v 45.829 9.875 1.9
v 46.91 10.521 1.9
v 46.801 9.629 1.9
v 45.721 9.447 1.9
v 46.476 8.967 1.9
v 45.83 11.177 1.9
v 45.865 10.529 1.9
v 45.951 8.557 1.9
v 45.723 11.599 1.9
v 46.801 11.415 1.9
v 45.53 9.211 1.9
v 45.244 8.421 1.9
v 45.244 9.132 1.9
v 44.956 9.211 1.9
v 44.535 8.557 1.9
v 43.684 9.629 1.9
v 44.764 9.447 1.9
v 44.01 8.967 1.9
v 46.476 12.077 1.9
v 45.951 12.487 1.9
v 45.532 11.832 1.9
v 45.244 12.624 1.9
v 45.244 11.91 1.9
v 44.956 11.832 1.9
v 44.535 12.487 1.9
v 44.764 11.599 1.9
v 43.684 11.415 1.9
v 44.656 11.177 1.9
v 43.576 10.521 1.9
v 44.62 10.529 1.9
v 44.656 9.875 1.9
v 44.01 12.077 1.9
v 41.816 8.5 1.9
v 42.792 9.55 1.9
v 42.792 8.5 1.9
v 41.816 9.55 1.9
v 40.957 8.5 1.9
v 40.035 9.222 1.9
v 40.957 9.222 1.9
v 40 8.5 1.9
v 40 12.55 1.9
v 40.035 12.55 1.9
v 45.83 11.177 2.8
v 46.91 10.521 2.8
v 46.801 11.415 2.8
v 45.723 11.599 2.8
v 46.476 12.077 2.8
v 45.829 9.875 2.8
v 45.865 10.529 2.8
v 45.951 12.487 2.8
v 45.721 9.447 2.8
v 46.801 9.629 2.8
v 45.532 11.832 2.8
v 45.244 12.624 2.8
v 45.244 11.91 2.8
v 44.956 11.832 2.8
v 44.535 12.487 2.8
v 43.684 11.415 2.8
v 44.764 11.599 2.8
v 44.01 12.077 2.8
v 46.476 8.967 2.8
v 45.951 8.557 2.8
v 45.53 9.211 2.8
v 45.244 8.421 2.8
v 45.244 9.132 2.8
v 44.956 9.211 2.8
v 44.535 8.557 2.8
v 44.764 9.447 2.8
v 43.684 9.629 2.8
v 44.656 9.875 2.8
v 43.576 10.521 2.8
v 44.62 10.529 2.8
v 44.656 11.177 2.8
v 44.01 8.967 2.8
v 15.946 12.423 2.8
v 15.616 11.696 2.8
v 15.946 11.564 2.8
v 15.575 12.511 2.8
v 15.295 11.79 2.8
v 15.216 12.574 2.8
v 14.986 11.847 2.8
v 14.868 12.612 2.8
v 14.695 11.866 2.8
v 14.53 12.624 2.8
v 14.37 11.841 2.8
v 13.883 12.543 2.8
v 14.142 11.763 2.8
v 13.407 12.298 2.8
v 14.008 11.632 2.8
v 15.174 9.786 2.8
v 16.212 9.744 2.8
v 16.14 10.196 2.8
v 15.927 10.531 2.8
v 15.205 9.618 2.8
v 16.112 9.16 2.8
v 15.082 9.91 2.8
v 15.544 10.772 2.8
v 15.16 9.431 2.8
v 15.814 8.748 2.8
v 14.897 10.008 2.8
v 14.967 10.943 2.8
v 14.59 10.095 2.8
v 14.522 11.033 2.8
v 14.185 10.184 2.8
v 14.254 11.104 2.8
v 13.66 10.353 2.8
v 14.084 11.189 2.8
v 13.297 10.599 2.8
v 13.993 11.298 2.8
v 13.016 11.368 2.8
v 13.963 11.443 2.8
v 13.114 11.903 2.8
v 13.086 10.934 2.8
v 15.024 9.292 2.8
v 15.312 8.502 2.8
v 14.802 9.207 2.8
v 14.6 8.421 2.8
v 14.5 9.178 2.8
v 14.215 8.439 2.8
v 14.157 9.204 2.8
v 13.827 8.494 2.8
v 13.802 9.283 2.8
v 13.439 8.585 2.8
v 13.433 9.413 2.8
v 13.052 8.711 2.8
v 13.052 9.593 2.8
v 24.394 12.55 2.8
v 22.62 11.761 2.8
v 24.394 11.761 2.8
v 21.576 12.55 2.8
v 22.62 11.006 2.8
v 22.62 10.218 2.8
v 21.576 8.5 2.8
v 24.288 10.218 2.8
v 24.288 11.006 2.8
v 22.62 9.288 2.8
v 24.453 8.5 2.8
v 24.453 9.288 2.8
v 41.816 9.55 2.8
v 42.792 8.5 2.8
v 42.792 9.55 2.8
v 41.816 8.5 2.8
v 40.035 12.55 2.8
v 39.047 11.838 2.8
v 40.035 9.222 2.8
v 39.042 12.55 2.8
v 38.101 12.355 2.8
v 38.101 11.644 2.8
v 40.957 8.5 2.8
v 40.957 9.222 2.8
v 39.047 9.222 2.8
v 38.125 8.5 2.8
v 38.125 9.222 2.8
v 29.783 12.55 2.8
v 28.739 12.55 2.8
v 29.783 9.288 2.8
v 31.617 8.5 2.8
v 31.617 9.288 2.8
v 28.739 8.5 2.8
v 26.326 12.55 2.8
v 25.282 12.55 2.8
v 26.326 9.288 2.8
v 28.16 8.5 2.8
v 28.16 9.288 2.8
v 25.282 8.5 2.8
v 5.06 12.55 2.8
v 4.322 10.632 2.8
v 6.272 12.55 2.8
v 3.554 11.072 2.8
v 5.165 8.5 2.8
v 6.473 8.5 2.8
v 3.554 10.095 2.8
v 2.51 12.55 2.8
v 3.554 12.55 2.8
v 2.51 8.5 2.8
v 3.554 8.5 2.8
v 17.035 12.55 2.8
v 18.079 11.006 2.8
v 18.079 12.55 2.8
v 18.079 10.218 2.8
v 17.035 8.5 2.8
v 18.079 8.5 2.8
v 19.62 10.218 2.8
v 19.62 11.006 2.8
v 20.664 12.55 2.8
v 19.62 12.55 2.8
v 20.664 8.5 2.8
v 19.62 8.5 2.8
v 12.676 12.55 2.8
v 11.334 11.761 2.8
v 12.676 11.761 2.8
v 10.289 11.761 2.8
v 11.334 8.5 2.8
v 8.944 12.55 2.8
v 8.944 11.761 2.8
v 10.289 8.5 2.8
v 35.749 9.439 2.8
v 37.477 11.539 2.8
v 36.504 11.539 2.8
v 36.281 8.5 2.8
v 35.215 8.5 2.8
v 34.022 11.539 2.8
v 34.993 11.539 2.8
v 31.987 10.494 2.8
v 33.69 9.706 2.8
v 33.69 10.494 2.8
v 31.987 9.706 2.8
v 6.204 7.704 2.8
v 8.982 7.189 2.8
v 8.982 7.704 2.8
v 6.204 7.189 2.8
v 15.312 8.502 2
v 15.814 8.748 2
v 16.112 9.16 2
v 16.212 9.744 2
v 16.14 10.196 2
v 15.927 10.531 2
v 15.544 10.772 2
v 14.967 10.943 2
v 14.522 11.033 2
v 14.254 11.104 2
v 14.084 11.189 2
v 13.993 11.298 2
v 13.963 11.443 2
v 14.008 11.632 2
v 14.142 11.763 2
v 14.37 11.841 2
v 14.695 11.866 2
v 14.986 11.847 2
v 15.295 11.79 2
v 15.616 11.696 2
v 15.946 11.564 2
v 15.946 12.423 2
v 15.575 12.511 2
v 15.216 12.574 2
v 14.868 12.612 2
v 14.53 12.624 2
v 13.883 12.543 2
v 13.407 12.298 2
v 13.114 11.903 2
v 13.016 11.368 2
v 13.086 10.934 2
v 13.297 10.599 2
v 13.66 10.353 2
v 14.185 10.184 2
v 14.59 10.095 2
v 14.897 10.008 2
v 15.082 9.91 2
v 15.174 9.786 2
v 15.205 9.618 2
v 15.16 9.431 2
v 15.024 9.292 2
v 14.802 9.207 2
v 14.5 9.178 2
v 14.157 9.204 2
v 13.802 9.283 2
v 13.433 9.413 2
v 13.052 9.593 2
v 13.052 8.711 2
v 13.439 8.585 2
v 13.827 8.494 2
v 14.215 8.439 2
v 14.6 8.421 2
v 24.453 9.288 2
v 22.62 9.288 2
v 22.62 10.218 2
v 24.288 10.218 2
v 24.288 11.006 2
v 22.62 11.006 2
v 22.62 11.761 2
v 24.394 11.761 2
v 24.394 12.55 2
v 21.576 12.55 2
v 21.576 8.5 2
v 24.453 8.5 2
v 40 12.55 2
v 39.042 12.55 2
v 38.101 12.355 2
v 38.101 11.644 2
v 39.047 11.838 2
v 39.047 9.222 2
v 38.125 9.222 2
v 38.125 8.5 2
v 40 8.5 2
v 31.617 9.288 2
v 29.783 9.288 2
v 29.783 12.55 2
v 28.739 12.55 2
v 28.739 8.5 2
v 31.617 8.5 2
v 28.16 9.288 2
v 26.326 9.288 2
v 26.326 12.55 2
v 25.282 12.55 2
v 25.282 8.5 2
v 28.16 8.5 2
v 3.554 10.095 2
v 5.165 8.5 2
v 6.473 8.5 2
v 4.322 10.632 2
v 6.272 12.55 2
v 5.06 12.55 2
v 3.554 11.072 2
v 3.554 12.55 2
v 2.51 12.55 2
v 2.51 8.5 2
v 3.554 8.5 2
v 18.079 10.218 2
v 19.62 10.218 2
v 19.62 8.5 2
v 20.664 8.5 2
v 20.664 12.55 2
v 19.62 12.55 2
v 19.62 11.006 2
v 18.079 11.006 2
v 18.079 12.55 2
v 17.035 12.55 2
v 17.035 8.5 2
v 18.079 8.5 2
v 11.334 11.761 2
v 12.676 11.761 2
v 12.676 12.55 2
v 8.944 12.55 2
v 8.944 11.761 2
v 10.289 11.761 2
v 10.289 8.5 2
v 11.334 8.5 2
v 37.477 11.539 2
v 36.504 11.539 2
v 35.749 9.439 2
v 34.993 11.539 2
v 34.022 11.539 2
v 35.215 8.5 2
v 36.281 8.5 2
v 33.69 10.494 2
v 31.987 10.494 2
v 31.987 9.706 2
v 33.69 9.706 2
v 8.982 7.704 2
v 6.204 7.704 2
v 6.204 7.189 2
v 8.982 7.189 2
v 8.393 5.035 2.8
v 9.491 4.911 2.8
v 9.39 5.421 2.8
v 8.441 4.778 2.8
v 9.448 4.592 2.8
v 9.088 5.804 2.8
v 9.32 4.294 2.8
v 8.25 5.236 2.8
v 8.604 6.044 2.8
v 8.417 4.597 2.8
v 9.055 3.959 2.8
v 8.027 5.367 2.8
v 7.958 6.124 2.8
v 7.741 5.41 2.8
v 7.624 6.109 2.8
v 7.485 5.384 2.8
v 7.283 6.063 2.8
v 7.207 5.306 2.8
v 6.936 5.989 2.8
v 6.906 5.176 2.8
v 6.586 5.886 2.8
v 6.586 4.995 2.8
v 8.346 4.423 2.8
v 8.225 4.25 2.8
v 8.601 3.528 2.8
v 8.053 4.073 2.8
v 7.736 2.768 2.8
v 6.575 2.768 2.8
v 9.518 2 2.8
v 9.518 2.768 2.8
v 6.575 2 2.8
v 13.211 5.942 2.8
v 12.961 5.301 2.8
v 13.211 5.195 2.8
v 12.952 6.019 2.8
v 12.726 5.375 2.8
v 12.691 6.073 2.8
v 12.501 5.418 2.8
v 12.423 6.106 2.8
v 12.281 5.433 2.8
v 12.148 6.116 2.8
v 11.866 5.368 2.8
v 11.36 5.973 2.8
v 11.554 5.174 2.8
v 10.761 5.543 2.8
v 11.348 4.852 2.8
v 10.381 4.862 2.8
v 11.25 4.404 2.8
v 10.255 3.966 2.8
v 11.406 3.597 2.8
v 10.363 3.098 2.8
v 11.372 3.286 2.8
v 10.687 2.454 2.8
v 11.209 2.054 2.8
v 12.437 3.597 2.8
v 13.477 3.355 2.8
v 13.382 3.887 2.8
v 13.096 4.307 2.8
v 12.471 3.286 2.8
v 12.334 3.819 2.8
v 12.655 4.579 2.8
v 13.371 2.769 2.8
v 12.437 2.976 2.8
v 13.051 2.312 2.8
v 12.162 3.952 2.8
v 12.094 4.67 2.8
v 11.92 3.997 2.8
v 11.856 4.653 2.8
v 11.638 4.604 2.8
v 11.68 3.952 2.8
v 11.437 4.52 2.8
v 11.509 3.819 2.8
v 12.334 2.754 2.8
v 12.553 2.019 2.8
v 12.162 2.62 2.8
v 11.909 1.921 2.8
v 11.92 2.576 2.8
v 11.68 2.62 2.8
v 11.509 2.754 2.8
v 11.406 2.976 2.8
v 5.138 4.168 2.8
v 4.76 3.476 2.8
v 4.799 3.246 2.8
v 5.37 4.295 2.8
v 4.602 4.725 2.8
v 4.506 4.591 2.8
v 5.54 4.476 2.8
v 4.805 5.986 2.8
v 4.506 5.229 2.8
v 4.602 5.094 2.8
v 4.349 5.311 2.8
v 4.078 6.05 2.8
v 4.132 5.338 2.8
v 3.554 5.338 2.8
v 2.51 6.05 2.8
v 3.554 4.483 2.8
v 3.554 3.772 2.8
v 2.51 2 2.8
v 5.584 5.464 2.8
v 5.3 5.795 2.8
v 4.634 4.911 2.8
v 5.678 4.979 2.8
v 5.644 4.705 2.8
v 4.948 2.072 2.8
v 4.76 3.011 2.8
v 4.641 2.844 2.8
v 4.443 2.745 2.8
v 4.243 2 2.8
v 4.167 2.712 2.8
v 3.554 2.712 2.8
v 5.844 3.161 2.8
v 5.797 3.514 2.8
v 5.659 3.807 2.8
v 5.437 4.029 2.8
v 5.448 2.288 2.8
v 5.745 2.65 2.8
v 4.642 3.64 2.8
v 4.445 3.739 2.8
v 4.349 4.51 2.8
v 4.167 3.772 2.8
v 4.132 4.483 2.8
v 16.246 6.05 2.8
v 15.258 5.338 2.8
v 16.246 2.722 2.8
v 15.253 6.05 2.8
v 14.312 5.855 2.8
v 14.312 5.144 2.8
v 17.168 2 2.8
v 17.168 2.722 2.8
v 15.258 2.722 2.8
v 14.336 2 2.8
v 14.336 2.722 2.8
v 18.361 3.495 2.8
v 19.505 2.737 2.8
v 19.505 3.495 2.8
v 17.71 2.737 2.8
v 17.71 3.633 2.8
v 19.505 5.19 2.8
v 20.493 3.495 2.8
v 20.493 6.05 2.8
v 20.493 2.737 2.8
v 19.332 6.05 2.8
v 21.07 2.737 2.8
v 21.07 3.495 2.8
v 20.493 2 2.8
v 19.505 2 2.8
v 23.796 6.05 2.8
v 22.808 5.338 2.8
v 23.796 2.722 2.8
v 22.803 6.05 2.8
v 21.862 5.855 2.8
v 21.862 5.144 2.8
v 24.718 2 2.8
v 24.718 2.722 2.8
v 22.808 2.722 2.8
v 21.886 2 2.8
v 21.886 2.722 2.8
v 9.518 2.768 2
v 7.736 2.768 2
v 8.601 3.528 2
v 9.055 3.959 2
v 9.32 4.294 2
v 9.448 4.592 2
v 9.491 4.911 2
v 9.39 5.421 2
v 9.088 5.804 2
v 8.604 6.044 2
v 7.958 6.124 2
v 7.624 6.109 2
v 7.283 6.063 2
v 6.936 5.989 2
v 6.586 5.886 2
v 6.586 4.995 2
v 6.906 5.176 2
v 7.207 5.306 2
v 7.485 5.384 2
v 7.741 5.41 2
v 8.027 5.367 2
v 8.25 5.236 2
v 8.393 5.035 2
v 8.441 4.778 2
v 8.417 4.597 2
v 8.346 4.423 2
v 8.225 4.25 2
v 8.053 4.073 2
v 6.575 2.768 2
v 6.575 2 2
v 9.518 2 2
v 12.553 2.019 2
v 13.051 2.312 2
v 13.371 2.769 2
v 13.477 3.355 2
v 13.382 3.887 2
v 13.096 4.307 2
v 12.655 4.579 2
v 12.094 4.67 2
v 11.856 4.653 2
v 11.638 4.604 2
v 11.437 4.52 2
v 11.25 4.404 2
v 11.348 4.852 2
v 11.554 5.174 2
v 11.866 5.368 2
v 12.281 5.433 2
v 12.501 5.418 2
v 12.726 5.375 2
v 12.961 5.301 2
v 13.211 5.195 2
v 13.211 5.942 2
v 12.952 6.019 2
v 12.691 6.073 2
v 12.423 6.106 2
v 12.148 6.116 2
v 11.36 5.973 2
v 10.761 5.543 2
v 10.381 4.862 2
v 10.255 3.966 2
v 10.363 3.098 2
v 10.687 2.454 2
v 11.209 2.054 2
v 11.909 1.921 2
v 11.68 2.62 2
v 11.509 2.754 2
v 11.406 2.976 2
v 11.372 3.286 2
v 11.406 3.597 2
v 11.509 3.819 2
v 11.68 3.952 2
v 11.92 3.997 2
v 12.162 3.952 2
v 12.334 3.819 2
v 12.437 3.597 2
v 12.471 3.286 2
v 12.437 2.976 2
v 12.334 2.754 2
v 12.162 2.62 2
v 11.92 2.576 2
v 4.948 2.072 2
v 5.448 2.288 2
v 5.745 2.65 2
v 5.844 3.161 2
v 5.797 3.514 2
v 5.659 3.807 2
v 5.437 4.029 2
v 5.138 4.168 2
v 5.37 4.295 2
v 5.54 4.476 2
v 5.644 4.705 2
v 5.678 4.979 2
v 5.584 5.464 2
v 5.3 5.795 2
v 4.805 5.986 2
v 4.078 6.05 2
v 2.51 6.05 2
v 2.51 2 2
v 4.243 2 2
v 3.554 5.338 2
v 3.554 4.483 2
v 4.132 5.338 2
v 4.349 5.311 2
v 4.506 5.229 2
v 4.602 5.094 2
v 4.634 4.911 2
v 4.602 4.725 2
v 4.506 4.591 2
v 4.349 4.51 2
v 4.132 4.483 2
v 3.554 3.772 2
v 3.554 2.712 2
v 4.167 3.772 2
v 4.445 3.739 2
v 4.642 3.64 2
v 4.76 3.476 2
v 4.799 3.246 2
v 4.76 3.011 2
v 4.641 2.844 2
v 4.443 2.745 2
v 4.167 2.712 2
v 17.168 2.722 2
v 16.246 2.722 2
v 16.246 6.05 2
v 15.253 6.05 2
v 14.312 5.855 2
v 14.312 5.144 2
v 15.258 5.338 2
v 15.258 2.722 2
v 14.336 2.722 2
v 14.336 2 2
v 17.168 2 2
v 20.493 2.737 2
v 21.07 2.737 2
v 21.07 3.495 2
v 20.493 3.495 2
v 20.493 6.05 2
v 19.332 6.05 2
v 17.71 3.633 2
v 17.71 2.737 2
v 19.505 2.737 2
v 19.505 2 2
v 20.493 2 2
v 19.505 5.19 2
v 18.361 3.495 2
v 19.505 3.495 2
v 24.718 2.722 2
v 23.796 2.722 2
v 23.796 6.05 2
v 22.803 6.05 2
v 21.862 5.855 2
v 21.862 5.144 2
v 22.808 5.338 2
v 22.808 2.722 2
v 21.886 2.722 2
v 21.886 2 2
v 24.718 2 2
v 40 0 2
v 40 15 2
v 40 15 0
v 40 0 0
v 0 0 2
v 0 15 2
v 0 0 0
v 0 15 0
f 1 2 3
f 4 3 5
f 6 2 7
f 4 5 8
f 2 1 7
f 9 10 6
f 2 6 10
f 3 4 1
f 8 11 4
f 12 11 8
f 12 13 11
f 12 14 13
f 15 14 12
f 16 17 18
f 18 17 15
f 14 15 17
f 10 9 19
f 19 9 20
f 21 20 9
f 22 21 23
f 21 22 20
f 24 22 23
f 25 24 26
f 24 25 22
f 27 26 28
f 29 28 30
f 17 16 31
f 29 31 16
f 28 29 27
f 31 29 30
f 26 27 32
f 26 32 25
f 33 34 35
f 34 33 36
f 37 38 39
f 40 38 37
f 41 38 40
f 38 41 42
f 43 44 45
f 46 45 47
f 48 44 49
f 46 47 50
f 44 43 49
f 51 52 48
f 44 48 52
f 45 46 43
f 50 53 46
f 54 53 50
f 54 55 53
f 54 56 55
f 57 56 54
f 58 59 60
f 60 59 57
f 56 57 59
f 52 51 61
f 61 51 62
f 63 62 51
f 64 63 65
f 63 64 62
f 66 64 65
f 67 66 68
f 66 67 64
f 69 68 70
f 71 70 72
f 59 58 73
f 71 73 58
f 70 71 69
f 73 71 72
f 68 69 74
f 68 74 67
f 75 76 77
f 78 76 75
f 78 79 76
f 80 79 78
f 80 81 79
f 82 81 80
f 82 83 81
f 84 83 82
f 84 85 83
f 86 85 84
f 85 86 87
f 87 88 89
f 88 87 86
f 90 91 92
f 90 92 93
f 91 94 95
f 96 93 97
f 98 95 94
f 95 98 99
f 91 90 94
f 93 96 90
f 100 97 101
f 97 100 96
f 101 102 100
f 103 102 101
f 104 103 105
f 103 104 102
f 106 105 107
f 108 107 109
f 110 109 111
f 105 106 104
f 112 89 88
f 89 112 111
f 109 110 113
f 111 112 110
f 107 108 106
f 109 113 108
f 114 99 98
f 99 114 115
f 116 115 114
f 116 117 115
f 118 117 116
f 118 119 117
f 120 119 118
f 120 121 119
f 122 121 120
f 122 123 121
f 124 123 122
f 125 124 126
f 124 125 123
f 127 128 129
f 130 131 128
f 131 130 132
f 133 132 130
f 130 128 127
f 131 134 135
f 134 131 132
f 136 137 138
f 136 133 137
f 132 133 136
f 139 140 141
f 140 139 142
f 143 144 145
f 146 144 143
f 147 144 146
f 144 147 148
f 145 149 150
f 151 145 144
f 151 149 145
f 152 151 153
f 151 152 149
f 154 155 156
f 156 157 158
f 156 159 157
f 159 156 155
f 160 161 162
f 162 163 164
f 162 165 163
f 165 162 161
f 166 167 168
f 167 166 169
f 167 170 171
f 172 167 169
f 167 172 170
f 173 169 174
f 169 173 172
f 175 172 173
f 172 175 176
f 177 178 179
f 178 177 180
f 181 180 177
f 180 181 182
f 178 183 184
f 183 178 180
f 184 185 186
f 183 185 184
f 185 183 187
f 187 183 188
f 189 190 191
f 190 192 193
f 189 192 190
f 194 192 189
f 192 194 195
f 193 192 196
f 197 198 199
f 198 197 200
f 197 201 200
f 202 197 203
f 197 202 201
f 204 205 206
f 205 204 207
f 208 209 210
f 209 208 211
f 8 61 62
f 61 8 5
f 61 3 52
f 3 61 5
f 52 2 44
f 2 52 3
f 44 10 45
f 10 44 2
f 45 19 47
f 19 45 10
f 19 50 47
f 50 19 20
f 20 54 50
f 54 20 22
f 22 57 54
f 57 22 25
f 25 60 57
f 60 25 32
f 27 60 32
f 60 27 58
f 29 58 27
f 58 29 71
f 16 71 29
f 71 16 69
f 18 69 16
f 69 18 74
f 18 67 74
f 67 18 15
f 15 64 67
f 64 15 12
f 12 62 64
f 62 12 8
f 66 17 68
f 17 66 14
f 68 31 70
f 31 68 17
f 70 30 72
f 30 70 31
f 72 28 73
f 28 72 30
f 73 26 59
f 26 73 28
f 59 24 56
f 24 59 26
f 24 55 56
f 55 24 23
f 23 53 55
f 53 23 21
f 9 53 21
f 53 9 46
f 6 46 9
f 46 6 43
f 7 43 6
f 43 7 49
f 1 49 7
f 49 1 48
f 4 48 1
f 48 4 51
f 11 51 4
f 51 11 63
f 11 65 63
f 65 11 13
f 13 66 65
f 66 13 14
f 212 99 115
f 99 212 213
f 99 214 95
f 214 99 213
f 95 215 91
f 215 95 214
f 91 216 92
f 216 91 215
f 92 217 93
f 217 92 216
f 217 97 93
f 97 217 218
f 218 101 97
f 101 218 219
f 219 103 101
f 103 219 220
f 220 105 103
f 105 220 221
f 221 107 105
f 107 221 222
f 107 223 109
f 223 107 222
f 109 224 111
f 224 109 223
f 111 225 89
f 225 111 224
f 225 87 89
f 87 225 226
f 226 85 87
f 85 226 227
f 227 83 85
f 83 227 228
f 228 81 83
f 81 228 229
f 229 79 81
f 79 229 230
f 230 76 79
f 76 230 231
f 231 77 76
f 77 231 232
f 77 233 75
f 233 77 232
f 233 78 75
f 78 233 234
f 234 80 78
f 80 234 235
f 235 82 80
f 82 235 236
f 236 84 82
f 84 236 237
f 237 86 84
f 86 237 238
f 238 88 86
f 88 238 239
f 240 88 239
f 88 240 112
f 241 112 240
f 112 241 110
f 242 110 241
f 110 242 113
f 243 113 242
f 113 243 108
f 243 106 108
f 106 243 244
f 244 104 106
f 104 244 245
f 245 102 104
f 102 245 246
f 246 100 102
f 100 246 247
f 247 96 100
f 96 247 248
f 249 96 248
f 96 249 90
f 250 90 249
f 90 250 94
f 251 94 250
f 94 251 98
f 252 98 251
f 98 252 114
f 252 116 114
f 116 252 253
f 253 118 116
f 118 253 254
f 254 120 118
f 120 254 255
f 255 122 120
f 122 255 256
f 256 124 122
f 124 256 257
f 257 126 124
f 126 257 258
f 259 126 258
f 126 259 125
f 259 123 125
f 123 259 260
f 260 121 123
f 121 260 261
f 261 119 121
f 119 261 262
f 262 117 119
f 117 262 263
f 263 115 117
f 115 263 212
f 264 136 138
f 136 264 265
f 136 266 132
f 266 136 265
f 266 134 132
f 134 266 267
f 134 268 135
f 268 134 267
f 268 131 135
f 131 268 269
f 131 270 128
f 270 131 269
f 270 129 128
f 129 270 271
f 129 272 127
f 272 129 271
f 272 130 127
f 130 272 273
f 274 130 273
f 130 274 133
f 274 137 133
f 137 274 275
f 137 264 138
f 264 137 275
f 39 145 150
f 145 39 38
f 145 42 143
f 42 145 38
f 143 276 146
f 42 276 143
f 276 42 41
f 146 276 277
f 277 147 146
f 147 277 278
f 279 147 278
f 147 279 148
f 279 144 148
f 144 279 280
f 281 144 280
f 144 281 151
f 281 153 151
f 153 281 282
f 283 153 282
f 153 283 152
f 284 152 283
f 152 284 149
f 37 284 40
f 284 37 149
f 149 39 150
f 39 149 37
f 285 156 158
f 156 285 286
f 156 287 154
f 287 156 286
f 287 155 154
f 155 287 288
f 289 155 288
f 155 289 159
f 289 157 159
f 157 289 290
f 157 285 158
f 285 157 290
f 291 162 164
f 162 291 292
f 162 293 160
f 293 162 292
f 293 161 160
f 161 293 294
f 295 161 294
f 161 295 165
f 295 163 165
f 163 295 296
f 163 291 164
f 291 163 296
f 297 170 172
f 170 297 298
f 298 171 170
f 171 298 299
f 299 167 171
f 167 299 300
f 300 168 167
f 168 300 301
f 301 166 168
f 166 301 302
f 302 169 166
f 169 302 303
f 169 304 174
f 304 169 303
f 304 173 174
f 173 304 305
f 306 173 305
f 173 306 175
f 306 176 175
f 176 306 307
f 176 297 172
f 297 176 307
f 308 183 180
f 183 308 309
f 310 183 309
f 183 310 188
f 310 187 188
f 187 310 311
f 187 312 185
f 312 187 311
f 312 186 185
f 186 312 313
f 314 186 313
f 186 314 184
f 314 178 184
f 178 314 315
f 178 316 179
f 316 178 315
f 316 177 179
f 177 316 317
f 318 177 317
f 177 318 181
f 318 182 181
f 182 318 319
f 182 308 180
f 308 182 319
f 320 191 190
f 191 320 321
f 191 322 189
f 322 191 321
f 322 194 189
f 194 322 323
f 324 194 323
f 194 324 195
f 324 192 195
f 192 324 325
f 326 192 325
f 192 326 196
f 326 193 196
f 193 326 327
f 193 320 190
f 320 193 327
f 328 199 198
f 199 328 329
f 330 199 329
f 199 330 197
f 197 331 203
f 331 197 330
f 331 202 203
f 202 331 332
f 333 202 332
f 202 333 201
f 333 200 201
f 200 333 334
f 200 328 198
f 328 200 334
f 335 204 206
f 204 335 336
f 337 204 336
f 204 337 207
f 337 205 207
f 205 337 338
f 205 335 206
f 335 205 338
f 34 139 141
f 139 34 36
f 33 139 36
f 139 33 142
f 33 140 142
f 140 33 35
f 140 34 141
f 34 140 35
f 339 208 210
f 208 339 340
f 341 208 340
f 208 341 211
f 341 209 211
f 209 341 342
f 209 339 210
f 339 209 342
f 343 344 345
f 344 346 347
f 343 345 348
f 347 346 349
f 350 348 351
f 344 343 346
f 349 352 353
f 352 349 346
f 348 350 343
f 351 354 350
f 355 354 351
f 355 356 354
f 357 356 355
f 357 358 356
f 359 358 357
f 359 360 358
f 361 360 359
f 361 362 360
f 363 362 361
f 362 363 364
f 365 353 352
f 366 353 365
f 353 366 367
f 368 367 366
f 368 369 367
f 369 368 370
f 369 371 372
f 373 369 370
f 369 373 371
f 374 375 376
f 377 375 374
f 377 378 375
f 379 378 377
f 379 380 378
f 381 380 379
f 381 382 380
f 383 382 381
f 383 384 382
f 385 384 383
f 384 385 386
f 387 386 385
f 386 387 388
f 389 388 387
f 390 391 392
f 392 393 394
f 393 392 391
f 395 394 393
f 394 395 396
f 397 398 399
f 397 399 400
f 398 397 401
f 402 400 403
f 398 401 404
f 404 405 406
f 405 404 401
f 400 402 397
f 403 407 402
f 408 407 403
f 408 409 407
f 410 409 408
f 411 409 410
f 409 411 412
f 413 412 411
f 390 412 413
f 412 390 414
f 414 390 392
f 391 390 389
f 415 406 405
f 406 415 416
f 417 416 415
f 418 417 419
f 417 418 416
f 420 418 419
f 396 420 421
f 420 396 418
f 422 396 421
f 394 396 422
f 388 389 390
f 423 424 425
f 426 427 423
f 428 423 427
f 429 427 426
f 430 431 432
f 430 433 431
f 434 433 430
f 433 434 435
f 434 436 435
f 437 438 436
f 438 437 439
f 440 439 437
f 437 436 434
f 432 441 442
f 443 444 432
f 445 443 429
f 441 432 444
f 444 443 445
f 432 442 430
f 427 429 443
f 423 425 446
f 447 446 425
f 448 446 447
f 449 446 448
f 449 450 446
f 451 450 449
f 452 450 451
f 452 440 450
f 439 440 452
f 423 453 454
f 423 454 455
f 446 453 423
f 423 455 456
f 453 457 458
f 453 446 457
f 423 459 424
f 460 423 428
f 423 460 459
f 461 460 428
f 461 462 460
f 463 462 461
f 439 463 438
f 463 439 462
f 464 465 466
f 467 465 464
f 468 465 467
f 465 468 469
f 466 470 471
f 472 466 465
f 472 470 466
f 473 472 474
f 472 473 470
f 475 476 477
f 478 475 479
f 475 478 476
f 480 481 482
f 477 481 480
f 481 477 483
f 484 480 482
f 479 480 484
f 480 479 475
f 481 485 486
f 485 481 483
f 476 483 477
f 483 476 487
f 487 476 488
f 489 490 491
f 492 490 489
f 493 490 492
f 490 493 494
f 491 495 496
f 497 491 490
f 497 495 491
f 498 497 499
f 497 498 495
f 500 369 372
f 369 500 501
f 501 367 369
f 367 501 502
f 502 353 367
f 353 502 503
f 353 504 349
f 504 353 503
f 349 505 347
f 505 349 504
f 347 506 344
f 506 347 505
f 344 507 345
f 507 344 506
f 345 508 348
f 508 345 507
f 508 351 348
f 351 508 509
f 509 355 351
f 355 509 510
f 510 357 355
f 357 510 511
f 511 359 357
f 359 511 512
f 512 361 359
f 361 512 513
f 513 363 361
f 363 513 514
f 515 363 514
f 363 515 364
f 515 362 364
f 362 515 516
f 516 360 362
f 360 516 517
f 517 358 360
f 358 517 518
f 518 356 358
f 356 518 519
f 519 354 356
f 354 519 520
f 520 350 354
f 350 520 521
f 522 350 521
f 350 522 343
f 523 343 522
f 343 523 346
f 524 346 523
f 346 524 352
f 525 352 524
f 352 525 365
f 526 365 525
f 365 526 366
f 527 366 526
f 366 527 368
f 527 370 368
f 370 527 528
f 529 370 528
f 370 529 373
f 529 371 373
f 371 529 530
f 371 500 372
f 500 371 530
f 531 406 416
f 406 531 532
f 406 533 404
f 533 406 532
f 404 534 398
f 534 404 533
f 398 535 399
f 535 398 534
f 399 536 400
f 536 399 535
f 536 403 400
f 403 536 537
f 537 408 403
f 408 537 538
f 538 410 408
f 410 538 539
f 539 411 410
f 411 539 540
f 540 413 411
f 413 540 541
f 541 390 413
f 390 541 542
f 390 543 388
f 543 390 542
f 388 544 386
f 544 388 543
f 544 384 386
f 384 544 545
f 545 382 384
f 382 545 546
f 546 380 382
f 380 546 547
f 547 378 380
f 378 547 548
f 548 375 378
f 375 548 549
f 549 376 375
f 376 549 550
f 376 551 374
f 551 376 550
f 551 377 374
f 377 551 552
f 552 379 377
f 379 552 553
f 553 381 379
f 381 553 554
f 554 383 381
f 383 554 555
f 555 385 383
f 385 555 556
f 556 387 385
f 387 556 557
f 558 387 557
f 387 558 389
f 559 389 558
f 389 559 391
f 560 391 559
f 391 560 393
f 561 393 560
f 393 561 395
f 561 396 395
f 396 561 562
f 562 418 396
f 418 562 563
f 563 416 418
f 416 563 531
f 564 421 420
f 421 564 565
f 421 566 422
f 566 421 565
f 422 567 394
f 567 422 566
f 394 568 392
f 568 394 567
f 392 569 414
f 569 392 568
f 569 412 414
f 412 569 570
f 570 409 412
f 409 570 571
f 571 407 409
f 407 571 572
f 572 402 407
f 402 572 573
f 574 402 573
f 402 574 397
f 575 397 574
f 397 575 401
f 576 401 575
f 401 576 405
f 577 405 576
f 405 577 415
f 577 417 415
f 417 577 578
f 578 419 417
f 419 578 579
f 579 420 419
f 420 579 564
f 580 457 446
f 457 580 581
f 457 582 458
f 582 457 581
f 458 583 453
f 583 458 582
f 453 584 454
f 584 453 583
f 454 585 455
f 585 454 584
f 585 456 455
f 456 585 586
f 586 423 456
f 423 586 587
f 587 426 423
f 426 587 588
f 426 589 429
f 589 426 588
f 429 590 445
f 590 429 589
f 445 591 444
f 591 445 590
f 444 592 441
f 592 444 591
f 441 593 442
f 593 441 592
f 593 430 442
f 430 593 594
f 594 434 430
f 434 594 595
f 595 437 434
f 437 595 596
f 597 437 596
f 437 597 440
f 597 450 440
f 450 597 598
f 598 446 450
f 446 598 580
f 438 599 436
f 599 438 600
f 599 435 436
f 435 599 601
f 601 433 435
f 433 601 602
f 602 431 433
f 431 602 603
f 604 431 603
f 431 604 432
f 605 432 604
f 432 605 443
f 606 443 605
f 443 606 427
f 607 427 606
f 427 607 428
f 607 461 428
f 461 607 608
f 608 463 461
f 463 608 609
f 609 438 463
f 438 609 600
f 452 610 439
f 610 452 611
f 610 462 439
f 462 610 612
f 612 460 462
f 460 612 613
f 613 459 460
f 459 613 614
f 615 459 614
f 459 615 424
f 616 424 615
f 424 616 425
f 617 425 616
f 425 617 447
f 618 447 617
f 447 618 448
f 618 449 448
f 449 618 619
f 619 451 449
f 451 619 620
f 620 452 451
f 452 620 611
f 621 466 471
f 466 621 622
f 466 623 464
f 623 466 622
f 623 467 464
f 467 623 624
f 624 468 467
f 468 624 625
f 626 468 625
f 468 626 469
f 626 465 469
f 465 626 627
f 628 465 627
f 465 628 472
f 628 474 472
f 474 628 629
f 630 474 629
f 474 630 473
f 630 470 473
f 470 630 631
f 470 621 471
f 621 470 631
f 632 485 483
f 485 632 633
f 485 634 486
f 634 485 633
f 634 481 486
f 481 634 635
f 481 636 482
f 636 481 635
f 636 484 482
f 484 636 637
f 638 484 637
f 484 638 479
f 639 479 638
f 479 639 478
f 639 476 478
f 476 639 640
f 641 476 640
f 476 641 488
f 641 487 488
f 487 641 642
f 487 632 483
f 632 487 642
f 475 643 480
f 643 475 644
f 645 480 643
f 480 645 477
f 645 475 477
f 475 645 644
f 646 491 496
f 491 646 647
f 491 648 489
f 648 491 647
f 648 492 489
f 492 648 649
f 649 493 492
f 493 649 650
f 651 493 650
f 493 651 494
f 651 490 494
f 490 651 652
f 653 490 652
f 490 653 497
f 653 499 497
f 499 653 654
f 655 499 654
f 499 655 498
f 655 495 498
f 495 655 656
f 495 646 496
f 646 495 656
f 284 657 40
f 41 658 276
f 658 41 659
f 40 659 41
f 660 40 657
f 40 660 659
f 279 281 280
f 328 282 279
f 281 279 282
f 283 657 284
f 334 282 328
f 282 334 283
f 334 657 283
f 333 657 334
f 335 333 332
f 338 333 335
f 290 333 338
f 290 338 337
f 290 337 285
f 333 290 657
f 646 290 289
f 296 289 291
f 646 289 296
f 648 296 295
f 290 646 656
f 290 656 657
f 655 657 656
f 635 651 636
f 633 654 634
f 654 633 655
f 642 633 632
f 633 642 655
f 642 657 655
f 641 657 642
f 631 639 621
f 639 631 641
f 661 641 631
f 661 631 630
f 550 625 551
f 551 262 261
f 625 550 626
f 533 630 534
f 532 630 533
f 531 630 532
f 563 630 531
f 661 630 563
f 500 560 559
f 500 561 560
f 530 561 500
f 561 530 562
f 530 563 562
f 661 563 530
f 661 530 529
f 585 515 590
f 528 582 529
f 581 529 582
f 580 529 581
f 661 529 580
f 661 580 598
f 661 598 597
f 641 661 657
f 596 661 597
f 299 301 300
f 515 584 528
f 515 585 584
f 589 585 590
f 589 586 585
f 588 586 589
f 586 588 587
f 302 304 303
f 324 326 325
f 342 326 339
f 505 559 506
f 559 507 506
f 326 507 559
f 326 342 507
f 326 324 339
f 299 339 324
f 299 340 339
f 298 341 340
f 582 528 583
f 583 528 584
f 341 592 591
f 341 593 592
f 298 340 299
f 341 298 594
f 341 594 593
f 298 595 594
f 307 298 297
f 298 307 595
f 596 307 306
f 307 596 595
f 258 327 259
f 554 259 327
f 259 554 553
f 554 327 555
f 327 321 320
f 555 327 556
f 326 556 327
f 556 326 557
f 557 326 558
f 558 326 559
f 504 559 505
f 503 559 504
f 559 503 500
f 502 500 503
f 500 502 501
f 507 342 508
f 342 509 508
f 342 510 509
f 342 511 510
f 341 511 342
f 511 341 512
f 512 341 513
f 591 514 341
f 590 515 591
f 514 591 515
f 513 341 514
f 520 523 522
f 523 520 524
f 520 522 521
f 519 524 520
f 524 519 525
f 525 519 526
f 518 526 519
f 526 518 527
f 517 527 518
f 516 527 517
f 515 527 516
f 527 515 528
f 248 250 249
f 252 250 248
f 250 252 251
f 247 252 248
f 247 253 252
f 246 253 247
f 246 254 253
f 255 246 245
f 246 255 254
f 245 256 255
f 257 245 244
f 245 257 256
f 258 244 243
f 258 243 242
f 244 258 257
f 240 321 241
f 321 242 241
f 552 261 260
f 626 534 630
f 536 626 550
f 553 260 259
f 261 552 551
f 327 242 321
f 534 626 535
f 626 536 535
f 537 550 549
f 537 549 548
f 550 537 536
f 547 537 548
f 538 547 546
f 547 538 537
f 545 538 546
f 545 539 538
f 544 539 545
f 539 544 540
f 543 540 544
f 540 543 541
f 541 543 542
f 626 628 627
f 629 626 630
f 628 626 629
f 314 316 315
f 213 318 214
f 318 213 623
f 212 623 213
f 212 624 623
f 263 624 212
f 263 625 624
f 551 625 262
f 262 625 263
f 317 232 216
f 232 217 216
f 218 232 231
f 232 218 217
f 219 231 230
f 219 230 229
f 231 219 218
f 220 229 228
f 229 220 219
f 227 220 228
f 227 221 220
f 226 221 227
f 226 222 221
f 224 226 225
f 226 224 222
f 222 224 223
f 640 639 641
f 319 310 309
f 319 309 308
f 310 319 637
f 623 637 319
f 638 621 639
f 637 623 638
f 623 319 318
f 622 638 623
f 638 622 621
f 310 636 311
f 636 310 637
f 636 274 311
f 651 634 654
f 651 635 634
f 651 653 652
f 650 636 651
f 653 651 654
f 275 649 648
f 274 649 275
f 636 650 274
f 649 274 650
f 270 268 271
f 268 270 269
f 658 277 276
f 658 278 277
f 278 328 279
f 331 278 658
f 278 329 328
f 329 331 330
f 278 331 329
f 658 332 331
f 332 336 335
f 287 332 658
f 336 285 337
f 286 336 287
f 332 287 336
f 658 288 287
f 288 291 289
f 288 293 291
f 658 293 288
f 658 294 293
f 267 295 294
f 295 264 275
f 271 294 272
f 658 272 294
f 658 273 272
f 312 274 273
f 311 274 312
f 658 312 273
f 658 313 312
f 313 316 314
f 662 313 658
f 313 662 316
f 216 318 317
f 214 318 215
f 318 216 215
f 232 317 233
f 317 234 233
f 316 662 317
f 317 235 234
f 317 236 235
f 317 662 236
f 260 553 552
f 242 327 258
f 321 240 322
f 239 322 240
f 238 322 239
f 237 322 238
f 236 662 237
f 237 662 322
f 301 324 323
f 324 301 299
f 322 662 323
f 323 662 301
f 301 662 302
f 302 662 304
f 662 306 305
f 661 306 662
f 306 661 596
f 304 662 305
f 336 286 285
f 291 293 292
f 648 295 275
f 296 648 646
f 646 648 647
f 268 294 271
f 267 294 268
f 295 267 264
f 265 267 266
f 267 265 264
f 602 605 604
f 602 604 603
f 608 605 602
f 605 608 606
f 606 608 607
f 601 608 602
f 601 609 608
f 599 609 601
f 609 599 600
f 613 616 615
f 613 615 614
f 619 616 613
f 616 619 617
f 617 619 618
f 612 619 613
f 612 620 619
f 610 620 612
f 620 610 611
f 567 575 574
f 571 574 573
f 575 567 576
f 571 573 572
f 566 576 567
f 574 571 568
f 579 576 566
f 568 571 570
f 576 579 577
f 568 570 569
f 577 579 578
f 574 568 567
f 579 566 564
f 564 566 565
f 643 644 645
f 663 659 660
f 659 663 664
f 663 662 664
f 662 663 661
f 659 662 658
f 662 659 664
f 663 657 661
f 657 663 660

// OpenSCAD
module test_part()
{cube([40,15,2]);
    
    }
    
    
    
    
year= 26;
week = 14;
day = 1;
PartName = "Tshell";
partVersion = "v1.0";


partNunmber = str(PartName, "-",partVersion);

batch =str("B", formate_number(year),formate_number(week),day);





// debossed
    /*
difference(){
test_part();
translate([2,8.5,2-0.6])numbering(0.6+0.01,4,PartNumber =partNunmber );
    translate([2,2,2-0.6])numbering(0.6+0.01,4,PartNumber =batch);
}*/
// embossed

test_part();
translate([2,8.5,2-0.1])numbering(0.8+0.1,4,"TSHELL","v1.0","26141");
    



module numbering(t, s, PartName, Partversion, date)
    {
        linear_extrude(t)
text(str("K_",PartName,"-",Partversion),size = s,font = "Arial Rounded MT Bold:style=Bold");
        
        translate([0,-6.5,0])linear_extrude(t)
text(str("B",date),size = s,font = "Arial Rounded MT Bold:style=Bold");
        }

    
function formate_number(num) = 
    (
        
        (num < 10)?str("0",num): str(num)
        
         );
